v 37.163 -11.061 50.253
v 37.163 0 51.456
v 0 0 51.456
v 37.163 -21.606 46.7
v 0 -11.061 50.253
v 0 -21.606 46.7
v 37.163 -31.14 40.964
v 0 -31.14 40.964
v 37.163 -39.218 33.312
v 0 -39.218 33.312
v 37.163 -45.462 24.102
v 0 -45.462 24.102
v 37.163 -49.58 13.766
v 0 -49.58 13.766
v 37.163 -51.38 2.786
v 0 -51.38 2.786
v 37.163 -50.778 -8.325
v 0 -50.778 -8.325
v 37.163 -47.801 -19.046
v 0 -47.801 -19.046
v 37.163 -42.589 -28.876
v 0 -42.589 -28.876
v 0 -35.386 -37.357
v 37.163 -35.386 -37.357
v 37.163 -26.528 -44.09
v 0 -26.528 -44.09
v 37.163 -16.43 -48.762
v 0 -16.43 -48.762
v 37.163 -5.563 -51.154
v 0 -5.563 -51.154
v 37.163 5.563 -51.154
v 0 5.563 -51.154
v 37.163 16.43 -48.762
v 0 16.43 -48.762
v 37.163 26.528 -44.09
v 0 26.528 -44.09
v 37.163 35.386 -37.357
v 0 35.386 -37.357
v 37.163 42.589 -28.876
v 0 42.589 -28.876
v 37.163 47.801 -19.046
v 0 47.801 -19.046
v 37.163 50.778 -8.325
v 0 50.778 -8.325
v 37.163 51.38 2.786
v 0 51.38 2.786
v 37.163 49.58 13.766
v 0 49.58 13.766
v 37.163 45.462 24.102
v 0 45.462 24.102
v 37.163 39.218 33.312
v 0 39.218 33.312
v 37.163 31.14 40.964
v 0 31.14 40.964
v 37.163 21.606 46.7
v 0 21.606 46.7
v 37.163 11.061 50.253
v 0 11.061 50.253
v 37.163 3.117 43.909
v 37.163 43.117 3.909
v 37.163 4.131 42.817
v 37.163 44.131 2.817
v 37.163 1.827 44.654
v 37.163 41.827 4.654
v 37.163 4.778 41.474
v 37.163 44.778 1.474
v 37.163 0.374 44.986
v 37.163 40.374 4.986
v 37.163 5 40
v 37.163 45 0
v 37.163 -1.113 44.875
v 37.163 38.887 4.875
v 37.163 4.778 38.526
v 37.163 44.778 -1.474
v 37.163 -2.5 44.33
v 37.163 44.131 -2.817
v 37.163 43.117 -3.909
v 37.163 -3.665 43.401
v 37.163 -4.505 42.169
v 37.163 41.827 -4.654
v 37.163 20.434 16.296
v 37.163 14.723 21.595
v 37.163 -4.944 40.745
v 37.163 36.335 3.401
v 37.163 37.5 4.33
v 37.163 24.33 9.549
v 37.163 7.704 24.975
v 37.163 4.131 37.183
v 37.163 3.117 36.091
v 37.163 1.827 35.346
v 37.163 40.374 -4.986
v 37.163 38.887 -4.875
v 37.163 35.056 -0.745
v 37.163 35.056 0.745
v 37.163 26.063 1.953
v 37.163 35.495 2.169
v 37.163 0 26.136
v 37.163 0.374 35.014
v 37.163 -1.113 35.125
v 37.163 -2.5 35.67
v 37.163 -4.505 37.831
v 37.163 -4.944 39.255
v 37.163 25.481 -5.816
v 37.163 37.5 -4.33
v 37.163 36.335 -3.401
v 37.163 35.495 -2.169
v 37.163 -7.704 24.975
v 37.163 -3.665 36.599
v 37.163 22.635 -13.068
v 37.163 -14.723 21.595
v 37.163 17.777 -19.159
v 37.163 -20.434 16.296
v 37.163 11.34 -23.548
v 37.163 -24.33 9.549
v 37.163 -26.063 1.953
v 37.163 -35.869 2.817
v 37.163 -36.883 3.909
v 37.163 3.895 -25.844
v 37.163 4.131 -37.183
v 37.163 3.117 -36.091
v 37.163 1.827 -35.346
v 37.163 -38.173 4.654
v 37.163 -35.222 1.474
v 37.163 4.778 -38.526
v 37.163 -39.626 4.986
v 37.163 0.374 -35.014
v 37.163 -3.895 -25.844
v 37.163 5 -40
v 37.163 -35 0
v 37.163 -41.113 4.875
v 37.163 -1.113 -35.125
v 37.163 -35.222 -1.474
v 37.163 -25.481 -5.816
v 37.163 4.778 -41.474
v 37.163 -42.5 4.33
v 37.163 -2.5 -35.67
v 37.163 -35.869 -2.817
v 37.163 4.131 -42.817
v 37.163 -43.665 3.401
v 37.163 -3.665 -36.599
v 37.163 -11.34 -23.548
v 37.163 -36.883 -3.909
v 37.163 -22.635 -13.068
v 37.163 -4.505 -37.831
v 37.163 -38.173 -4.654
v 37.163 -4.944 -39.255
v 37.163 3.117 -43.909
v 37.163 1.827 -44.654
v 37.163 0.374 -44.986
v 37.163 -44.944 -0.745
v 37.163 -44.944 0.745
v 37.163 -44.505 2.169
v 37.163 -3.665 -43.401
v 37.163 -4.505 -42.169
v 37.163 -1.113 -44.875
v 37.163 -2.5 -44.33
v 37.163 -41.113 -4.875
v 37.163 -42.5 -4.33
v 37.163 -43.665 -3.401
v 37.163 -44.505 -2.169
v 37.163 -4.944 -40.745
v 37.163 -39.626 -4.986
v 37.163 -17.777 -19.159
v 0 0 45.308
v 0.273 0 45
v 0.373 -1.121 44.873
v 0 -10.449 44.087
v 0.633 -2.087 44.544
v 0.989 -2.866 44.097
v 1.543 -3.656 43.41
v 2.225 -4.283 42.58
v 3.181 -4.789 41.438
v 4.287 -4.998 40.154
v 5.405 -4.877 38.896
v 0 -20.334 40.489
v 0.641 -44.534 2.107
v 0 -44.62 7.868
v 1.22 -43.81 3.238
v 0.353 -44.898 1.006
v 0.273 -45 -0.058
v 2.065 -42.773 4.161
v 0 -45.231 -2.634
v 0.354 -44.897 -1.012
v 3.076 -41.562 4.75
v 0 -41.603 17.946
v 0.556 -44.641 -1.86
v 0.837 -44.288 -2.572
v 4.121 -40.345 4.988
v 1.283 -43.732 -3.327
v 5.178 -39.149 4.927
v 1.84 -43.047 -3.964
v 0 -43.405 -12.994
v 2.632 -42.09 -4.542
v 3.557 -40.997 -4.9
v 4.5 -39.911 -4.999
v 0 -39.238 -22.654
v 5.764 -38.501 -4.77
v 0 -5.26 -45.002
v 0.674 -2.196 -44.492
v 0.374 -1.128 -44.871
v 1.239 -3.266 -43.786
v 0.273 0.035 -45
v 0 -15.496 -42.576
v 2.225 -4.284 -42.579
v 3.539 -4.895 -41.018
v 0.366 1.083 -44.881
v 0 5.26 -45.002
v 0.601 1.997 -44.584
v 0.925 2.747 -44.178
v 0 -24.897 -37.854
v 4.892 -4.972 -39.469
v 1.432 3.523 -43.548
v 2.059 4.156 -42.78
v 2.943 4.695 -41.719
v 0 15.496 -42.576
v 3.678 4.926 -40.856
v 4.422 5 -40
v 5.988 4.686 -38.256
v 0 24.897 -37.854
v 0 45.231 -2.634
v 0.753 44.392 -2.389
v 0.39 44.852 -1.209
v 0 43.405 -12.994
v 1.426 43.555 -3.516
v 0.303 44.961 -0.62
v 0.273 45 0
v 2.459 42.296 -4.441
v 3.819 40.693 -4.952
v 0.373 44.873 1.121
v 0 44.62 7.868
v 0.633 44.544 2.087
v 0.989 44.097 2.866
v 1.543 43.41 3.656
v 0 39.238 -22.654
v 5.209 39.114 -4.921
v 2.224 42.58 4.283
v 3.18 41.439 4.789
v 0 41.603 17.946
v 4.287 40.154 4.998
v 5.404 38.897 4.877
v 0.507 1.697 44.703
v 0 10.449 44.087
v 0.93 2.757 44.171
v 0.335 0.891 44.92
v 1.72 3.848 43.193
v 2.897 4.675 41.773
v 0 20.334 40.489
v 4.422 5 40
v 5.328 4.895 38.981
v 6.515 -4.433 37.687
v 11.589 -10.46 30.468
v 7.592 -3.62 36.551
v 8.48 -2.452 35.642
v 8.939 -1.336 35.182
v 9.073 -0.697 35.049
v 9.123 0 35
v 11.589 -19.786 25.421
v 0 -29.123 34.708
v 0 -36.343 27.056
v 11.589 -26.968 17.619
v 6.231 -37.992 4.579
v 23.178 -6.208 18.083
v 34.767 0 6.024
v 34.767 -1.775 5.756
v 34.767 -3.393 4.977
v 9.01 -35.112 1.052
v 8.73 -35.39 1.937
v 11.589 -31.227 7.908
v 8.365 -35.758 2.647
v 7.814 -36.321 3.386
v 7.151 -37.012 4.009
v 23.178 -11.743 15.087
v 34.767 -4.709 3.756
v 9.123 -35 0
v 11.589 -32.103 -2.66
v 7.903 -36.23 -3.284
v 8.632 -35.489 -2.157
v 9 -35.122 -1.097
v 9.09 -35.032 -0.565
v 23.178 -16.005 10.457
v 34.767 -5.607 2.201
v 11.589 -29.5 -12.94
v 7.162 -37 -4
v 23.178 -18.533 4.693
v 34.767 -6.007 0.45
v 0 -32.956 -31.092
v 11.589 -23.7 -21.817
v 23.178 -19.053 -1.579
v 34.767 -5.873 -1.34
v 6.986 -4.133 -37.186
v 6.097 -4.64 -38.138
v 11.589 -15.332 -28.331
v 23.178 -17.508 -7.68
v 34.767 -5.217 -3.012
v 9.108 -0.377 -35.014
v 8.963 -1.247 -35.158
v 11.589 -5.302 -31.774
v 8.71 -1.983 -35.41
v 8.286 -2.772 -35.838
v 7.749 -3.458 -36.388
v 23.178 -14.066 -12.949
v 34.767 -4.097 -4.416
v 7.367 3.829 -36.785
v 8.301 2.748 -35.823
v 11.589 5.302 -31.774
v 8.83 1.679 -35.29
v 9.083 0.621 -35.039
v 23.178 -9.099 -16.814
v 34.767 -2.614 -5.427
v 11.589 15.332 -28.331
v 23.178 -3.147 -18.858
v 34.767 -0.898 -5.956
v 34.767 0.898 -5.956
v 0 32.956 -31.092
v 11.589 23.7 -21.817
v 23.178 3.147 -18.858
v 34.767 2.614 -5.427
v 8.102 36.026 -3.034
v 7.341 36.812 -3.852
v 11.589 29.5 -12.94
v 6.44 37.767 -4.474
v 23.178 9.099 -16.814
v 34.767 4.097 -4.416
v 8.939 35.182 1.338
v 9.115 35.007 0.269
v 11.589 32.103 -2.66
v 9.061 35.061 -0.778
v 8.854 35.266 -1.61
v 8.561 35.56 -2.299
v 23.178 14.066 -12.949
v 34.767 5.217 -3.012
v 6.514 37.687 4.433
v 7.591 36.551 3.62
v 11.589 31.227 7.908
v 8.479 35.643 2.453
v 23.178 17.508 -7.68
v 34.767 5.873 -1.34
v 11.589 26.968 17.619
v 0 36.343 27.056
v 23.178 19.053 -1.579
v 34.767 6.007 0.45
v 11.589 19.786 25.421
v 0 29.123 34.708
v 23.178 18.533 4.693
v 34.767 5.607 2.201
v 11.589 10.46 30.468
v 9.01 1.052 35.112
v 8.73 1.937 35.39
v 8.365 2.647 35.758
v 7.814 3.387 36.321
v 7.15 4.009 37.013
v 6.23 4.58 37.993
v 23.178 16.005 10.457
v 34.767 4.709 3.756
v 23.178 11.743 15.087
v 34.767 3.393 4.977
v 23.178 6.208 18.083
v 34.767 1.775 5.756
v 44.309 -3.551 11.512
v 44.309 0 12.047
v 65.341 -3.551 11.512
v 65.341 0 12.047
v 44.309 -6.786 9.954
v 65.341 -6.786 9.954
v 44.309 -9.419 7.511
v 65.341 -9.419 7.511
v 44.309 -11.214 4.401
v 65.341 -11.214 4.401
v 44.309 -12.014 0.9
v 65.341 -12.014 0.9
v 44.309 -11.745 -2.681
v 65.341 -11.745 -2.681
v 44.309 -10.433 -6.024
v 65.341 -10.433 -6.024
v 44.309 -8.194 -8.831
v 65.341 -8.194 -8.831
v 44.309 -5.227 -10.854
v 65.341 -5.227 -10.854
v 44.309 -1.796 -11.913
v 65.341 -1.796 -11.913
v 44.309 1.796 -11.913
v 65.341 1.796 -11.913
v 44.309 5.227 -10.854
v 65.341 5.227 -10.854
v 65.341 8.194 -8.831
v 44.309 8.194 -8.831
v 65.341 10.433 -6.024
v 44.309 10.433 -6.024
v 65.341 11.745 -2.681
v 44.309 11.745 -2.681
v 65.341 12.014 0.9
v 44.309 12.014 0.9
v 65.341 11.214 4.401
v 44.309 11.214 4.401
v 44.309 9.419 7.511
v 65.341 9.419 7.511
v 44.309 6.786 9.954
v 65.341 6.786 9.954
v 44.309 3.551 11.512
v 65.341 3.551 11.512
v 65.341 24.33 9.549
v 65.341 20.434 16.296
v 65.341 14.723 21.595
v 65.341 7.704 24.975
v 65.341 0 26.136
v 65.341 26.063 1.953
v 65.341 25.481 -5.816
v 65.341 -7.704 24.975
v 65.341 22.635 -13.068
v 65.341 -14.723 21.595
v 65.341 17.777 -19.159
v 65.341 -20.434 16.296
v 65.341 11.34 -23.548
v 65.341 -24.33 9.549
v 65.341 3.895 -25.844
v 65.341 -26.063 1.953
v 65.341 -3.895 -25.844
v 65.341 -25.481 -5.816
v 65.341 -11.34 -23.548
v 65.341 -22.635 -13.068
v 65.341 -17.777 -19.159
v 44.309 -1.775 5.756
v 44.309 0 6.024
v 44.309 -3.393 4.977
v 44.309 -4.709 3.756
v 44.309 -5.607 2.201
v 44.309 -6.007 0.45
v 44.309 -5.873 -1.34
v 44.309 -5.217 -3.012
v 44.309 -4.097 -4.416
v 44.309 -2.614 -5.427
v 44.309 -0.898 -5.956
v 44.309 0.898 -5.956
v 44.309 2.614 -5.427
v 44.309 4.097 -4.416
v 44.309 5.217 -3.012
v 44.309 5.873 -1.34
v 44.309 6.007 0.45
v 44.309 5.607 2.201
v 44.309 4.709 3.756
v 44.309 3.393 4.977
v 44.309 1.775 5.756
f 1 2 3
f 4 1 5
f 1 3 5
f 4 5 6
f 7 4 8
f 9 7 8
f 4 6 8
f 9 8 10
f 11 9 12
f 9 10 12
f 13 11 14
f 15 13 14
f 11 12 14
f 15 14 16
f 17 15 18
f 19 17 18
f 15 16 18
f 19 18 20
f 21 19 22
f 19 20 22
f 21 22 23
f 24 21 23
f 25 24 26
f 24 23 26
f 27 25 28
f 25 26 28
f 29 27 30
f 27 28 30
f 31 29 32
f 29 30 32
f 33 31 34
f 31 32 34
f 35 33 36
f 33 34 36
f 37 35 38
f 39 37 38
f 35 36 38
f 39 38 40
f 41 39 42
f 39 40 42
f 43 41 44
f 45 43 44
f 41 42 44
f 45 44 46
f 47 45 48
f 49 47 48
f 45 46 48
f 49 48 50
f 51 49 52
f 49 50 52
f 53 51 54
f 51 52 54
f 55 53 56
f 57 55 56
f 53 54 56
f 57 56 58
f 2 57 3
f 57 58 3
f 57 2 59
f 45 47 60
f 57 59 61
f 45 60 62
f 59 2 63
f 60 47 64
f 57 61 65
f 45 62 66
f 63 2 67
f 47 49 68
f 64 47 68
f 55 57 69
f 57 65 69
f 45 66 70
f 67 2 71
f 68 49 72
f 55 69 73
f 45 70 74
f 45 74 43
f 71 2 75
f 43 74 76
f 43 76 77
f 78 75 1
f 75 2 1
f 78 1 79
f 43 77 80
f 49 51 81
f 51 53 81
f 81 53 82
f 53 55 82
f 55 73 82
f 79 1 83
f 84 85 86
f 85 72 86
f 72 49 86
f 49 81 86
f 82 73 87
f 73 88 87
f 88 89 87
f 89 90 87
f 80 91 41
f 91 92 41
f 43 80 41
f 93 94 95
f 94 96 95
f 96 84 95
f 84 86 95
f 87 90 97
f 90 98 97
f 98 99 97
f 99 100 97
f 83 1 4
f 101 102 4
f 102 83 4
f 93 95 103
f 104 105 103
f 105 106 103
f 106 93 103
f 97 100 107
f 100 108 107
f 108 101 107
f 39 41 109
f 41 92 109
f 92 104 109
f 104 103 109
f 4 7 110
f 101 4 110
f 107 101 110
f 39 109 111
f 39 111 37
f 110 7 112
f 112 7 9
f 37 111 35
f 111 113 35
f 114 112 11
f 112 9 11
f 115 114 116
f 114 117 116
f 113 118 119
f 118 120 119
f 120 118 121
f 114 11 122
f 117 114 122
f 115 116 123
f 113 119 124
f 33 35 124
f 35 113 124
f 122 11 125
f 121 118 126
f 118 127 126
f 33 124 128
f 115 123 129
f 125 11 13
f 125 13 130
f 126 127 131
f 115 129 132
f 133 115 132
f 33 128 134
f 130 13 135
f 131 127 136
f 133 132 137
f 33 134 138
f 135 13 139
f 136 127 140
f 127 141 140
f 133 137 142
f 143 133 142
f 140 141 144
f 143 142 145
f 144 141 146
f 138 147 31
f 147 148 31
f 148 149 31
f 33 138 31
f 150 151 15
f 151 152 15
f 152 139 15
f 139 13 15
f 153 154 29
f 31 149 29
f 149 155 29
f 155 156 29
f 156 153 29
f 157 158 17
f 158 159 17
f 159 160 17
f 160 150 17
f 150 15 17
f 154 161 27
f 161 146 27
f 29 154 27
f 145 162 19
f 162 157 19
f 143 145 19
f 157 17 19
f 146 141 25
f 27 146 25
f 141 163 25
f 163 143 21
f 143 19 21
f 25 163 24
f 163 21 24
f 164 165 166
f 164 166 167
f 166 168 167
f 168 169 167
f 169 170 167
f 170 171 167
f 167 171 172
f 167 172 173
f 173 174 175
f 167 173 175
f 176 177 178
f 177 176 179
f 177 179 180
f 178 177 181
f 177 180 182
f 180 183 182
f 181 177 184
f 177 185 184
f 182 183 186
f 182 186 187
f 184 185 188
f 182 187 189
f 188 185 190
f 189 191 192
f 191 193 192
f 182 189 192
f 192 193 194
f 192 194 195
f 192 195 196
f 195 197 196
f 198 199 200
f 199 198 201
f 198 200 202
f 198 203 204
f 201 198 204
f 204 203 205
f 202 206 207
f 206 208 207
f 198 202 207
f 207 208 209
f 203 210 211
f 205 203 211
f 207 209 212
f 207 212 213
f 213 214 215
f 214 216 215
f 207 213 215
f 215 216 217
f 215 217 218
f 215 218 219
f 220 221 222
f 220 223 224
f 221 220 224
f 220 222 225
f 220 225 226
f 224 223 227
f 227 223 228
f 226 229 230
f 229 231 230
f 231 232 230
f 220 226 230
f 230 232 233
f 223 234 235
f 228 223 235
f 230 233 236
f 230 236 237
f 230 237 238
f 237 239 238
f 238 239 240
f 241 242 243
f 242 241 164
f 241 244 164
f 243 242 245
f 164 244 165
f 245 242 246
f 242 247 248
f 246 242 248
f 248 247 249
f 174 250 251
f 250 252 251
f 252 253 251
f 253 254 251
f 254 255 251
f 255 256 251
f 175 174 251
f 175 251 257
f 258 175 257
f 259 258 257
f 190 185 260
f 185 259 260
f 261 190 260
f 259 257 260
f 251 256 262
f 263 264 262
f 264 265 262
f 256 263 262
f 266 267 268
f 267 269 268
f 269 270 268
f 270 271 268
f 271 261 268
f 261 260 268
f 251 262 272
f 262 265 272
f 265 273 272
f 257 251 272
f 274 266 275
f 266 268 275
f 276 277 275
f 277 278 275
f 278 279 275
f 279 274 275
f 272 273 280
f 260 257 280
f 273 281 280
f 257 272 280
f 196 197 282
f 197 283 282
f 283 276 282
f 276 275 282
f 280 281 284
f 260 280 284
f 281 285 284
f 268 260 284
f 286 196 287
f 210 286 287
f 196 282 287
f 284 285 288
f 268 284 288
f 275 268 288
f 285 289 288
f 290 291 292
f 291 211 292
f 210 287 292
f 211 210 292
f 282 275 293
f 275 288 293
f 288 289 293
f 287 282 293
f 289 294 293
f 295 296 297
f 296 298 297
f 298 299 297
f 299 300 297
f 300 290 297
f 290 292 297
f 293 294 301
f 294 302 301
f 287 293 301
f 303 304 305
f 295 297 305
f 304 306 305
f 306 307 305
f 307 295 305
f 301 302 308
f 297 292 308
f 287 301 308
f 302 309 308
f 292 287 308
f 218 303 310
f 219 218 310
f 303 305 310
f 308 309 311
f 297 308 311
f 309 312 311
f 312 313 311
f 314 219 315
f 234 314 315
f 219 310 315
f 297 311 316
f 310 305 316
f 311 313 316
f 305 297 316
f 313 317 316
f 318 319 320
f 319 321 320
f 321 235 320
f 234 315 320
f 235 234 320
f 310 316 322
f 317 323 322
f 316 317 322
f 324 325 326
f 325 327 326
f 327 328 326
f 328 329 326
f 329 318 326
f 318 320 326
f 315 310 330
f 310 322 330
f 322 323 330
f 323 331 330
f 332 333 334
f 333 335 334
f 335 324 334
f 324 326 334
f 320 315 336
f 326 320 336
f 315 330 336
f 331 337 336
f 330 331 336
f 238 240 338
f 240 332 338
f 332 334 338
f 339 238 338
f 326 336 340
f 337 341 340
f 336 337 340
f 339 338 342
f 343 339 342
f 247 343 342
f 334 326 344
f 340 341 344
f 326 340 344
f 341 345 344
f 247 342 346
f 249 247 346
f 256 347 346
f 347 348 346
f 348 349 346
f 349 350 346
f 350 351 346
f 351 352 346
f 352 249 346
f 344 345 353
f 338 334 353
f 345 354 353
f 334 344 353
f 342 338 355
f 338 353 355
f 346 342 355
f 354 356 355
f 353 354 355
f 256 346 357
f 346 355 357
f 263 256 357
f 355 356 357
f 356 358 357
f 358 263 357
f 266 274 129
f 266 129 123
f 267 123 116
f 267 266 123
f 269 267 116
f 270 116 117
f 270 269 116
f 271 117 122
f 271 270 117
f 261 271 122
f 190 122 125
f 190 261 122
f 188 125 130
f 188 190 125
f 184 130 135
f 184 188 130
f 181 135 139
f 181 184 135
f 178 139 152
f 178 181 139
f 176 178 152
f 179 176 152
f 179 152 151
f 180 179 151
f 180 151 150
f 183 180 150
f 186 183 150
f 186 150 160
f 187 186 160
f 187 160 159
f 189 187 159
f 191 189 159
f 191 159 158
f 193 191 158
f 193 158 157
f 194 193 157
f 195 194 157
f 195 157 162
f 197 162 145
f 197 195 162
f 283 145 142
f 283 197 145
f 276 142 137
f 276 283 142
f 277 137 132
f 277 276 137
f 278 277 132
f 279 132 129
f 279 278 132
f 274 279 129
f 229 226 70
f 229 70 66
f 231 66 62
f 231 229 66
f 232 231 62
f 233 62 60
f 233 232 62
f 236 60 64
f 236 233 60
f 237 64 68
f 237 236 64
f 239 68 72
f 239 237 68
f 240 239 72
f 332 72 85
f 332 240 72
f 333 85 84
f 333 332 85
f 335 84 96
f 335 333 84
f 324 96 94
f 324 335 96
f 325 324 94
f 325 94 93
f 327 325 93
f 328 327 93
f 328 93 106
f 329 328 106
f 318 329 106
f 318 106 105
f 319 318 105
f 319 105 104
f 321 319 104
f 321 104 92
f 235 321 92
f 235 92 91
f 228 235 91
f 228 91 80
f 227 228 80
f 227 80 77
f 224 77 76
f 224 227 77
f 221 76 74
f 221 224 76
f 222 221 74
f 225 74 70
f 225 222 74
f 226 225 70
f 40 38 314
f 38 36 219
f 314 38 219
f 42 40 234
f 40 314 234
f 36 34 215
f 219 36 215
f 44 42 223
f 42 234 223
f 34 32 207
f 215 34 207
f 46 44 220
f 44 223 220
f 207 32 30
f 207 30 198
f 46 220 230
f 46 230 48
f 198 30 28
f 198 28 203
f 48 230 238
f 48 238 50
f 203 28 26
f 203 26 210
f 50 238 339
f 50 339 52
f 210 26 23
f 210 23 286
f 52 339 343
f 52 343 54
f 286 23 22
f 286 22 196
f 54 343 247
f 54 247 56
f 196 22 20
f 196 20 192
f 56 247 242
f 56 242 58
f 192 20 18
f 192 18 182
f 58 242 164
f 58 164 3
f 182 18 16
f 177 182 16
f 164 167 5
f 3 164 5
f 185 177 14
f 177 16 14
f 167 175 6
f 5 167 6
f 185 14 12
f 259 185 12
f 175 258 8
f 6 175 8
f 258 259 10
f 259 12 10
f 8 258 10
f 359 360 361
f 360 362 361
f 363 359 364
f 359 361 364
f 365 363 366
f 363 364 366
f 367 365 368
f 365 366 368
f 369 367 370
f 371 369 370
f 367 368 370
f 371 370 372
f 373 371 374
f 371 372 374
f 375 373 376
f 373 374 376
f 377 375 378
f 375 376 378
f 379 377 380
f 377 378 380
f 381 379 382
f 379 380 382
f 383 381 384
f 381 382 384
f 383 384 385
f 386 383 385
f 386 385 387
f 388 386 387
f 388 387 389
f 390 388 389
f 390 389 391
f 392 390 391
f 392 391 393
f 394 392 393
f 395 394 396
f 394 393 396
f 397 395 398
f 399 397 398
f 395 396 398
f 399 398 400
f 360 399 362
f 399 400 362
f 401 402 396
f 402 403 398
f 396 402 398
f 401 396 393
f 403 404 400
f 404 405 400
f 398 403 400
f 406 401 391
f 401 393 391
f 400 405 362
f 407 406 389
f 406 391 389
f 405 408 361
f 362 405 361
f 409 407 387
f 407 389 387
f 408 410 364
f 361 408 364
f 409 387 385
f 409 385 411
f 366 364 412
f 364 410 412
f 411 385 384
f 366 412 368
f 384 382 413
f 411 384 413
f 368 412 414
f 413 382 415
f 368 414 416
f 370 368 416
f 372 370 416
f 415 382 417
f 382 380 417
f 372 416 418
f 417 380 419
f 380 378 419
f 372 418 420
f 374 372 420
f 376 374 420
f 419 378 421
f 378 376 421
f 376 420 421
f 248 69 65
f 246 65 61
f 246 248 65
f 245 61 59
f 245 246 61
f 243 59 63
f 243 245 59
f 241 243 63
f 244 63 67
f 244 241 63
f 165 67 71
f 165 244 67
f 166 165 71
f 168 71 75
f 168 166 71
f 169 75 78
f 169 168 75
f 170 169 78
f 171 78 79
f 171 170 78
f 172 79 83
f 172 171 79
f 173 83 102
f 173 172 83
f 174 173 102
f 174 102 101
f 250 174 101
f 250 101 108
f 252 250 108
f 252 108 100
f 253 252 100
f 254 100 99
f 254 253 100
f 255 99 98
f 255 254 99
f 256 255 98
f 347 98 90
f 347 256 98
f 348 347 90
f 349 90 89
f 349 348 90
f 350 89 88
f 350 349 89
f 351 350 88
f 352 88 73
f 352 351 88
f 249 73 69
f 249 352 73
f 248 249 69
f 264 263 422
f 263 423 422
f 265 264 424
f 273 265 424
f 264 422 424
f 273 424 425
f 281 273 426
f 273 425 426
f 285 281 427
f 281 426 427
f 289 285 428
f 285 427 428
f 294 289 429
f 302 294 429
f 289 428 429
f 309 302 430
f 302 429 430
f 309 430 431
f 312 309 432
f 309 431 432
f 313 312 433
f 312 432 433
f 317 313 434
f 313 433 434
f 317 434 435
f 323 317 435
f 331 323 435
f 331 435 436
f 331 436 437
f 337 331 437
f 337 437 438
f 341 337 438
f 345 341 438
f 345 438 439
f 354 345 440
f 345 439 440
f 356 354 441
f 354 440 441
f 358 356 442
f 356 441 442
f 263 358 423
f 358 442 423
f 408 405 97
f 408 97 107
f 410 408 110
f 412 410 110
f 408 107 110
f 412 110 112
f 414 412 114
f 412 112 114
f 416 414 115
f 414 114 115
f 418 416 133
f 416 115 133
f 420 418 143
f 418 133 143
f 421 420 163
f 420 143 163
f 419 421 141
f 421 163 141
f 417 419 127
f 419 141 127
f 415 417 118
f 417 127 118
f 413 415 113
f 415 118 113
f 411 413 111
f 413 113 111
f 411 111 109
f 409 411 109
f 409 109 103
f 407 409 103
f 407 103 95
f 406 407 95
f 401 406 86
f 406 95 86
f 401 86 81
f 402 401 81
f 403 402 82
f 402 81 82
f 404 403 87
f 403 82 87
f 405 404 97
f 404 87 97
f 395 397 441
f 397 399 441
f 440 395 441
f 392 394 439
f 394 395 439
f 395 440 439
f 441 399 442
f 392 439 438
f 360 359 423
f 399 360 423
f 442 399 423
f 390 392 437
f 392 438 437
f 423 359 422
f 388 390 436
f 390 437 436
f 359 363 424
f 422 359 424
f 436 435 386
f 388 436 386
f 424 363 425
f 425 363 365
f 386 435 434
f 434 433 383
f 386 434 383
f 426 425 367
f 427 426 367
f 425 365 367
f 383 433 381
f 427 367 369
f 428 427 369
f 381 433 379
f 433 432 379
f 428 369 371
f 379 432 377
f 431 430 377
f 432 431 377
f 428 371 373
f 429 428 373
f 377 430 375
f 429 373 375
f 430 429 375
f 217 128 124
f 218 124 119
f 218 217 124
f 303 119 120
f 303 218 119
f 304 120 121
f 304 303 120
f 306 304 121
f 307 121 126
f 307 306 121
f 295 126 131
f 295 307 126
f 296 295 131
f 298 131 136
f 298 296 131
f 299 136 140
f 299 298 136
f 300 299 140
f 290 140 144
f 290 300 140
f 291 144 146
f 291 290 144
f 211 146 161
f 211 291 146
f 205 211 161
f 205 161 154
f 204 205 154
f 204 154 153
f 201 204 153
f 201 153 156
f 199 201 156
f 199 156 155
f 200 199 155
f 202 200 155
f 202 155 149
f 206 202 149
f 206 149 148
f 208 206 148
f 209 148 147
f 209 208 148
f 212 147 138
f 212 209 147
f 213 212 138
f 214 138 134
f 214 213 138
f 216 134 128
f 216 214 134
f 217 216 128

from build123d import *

# Parameters (mm, degrees)
F2_R     = 5
F3_DEPTH = 65.341817


with BuildPart() as f1:
    # F0 (on Front) → F1 (revolve)
    with BuildSketch(Plane.XZ):
        Polygon((0, 51.4559), (0, 45.307968), (34.767002, 6.023608), (44.309229, 6.023608), (44.309229, 12.047216), (65.340817, 12.047216), (65.340817, 26.136331), (37.162587, 26.136331), (37.162587, 51.4559), align=None)
    revolve(axis=Axis((22.154614, 0, 0), (1, 0, 0)))

    # F2 (on Right) → F3 (cut, through all)
    with BuildSketch(Plane.YZ):
        with Locations((0, 40)):
            Circle(F2_R)
        with Locations((-40, 0)):
            Circle(F2_R)
        with Locations((40, 0)):
            Circle(F2_R)
        with Locations((0, -40)):
            Circle(F2_R)
    extrude(amount=F3_DEPTH, mode=Mode.SUBTRACT)


solid = f1.part
